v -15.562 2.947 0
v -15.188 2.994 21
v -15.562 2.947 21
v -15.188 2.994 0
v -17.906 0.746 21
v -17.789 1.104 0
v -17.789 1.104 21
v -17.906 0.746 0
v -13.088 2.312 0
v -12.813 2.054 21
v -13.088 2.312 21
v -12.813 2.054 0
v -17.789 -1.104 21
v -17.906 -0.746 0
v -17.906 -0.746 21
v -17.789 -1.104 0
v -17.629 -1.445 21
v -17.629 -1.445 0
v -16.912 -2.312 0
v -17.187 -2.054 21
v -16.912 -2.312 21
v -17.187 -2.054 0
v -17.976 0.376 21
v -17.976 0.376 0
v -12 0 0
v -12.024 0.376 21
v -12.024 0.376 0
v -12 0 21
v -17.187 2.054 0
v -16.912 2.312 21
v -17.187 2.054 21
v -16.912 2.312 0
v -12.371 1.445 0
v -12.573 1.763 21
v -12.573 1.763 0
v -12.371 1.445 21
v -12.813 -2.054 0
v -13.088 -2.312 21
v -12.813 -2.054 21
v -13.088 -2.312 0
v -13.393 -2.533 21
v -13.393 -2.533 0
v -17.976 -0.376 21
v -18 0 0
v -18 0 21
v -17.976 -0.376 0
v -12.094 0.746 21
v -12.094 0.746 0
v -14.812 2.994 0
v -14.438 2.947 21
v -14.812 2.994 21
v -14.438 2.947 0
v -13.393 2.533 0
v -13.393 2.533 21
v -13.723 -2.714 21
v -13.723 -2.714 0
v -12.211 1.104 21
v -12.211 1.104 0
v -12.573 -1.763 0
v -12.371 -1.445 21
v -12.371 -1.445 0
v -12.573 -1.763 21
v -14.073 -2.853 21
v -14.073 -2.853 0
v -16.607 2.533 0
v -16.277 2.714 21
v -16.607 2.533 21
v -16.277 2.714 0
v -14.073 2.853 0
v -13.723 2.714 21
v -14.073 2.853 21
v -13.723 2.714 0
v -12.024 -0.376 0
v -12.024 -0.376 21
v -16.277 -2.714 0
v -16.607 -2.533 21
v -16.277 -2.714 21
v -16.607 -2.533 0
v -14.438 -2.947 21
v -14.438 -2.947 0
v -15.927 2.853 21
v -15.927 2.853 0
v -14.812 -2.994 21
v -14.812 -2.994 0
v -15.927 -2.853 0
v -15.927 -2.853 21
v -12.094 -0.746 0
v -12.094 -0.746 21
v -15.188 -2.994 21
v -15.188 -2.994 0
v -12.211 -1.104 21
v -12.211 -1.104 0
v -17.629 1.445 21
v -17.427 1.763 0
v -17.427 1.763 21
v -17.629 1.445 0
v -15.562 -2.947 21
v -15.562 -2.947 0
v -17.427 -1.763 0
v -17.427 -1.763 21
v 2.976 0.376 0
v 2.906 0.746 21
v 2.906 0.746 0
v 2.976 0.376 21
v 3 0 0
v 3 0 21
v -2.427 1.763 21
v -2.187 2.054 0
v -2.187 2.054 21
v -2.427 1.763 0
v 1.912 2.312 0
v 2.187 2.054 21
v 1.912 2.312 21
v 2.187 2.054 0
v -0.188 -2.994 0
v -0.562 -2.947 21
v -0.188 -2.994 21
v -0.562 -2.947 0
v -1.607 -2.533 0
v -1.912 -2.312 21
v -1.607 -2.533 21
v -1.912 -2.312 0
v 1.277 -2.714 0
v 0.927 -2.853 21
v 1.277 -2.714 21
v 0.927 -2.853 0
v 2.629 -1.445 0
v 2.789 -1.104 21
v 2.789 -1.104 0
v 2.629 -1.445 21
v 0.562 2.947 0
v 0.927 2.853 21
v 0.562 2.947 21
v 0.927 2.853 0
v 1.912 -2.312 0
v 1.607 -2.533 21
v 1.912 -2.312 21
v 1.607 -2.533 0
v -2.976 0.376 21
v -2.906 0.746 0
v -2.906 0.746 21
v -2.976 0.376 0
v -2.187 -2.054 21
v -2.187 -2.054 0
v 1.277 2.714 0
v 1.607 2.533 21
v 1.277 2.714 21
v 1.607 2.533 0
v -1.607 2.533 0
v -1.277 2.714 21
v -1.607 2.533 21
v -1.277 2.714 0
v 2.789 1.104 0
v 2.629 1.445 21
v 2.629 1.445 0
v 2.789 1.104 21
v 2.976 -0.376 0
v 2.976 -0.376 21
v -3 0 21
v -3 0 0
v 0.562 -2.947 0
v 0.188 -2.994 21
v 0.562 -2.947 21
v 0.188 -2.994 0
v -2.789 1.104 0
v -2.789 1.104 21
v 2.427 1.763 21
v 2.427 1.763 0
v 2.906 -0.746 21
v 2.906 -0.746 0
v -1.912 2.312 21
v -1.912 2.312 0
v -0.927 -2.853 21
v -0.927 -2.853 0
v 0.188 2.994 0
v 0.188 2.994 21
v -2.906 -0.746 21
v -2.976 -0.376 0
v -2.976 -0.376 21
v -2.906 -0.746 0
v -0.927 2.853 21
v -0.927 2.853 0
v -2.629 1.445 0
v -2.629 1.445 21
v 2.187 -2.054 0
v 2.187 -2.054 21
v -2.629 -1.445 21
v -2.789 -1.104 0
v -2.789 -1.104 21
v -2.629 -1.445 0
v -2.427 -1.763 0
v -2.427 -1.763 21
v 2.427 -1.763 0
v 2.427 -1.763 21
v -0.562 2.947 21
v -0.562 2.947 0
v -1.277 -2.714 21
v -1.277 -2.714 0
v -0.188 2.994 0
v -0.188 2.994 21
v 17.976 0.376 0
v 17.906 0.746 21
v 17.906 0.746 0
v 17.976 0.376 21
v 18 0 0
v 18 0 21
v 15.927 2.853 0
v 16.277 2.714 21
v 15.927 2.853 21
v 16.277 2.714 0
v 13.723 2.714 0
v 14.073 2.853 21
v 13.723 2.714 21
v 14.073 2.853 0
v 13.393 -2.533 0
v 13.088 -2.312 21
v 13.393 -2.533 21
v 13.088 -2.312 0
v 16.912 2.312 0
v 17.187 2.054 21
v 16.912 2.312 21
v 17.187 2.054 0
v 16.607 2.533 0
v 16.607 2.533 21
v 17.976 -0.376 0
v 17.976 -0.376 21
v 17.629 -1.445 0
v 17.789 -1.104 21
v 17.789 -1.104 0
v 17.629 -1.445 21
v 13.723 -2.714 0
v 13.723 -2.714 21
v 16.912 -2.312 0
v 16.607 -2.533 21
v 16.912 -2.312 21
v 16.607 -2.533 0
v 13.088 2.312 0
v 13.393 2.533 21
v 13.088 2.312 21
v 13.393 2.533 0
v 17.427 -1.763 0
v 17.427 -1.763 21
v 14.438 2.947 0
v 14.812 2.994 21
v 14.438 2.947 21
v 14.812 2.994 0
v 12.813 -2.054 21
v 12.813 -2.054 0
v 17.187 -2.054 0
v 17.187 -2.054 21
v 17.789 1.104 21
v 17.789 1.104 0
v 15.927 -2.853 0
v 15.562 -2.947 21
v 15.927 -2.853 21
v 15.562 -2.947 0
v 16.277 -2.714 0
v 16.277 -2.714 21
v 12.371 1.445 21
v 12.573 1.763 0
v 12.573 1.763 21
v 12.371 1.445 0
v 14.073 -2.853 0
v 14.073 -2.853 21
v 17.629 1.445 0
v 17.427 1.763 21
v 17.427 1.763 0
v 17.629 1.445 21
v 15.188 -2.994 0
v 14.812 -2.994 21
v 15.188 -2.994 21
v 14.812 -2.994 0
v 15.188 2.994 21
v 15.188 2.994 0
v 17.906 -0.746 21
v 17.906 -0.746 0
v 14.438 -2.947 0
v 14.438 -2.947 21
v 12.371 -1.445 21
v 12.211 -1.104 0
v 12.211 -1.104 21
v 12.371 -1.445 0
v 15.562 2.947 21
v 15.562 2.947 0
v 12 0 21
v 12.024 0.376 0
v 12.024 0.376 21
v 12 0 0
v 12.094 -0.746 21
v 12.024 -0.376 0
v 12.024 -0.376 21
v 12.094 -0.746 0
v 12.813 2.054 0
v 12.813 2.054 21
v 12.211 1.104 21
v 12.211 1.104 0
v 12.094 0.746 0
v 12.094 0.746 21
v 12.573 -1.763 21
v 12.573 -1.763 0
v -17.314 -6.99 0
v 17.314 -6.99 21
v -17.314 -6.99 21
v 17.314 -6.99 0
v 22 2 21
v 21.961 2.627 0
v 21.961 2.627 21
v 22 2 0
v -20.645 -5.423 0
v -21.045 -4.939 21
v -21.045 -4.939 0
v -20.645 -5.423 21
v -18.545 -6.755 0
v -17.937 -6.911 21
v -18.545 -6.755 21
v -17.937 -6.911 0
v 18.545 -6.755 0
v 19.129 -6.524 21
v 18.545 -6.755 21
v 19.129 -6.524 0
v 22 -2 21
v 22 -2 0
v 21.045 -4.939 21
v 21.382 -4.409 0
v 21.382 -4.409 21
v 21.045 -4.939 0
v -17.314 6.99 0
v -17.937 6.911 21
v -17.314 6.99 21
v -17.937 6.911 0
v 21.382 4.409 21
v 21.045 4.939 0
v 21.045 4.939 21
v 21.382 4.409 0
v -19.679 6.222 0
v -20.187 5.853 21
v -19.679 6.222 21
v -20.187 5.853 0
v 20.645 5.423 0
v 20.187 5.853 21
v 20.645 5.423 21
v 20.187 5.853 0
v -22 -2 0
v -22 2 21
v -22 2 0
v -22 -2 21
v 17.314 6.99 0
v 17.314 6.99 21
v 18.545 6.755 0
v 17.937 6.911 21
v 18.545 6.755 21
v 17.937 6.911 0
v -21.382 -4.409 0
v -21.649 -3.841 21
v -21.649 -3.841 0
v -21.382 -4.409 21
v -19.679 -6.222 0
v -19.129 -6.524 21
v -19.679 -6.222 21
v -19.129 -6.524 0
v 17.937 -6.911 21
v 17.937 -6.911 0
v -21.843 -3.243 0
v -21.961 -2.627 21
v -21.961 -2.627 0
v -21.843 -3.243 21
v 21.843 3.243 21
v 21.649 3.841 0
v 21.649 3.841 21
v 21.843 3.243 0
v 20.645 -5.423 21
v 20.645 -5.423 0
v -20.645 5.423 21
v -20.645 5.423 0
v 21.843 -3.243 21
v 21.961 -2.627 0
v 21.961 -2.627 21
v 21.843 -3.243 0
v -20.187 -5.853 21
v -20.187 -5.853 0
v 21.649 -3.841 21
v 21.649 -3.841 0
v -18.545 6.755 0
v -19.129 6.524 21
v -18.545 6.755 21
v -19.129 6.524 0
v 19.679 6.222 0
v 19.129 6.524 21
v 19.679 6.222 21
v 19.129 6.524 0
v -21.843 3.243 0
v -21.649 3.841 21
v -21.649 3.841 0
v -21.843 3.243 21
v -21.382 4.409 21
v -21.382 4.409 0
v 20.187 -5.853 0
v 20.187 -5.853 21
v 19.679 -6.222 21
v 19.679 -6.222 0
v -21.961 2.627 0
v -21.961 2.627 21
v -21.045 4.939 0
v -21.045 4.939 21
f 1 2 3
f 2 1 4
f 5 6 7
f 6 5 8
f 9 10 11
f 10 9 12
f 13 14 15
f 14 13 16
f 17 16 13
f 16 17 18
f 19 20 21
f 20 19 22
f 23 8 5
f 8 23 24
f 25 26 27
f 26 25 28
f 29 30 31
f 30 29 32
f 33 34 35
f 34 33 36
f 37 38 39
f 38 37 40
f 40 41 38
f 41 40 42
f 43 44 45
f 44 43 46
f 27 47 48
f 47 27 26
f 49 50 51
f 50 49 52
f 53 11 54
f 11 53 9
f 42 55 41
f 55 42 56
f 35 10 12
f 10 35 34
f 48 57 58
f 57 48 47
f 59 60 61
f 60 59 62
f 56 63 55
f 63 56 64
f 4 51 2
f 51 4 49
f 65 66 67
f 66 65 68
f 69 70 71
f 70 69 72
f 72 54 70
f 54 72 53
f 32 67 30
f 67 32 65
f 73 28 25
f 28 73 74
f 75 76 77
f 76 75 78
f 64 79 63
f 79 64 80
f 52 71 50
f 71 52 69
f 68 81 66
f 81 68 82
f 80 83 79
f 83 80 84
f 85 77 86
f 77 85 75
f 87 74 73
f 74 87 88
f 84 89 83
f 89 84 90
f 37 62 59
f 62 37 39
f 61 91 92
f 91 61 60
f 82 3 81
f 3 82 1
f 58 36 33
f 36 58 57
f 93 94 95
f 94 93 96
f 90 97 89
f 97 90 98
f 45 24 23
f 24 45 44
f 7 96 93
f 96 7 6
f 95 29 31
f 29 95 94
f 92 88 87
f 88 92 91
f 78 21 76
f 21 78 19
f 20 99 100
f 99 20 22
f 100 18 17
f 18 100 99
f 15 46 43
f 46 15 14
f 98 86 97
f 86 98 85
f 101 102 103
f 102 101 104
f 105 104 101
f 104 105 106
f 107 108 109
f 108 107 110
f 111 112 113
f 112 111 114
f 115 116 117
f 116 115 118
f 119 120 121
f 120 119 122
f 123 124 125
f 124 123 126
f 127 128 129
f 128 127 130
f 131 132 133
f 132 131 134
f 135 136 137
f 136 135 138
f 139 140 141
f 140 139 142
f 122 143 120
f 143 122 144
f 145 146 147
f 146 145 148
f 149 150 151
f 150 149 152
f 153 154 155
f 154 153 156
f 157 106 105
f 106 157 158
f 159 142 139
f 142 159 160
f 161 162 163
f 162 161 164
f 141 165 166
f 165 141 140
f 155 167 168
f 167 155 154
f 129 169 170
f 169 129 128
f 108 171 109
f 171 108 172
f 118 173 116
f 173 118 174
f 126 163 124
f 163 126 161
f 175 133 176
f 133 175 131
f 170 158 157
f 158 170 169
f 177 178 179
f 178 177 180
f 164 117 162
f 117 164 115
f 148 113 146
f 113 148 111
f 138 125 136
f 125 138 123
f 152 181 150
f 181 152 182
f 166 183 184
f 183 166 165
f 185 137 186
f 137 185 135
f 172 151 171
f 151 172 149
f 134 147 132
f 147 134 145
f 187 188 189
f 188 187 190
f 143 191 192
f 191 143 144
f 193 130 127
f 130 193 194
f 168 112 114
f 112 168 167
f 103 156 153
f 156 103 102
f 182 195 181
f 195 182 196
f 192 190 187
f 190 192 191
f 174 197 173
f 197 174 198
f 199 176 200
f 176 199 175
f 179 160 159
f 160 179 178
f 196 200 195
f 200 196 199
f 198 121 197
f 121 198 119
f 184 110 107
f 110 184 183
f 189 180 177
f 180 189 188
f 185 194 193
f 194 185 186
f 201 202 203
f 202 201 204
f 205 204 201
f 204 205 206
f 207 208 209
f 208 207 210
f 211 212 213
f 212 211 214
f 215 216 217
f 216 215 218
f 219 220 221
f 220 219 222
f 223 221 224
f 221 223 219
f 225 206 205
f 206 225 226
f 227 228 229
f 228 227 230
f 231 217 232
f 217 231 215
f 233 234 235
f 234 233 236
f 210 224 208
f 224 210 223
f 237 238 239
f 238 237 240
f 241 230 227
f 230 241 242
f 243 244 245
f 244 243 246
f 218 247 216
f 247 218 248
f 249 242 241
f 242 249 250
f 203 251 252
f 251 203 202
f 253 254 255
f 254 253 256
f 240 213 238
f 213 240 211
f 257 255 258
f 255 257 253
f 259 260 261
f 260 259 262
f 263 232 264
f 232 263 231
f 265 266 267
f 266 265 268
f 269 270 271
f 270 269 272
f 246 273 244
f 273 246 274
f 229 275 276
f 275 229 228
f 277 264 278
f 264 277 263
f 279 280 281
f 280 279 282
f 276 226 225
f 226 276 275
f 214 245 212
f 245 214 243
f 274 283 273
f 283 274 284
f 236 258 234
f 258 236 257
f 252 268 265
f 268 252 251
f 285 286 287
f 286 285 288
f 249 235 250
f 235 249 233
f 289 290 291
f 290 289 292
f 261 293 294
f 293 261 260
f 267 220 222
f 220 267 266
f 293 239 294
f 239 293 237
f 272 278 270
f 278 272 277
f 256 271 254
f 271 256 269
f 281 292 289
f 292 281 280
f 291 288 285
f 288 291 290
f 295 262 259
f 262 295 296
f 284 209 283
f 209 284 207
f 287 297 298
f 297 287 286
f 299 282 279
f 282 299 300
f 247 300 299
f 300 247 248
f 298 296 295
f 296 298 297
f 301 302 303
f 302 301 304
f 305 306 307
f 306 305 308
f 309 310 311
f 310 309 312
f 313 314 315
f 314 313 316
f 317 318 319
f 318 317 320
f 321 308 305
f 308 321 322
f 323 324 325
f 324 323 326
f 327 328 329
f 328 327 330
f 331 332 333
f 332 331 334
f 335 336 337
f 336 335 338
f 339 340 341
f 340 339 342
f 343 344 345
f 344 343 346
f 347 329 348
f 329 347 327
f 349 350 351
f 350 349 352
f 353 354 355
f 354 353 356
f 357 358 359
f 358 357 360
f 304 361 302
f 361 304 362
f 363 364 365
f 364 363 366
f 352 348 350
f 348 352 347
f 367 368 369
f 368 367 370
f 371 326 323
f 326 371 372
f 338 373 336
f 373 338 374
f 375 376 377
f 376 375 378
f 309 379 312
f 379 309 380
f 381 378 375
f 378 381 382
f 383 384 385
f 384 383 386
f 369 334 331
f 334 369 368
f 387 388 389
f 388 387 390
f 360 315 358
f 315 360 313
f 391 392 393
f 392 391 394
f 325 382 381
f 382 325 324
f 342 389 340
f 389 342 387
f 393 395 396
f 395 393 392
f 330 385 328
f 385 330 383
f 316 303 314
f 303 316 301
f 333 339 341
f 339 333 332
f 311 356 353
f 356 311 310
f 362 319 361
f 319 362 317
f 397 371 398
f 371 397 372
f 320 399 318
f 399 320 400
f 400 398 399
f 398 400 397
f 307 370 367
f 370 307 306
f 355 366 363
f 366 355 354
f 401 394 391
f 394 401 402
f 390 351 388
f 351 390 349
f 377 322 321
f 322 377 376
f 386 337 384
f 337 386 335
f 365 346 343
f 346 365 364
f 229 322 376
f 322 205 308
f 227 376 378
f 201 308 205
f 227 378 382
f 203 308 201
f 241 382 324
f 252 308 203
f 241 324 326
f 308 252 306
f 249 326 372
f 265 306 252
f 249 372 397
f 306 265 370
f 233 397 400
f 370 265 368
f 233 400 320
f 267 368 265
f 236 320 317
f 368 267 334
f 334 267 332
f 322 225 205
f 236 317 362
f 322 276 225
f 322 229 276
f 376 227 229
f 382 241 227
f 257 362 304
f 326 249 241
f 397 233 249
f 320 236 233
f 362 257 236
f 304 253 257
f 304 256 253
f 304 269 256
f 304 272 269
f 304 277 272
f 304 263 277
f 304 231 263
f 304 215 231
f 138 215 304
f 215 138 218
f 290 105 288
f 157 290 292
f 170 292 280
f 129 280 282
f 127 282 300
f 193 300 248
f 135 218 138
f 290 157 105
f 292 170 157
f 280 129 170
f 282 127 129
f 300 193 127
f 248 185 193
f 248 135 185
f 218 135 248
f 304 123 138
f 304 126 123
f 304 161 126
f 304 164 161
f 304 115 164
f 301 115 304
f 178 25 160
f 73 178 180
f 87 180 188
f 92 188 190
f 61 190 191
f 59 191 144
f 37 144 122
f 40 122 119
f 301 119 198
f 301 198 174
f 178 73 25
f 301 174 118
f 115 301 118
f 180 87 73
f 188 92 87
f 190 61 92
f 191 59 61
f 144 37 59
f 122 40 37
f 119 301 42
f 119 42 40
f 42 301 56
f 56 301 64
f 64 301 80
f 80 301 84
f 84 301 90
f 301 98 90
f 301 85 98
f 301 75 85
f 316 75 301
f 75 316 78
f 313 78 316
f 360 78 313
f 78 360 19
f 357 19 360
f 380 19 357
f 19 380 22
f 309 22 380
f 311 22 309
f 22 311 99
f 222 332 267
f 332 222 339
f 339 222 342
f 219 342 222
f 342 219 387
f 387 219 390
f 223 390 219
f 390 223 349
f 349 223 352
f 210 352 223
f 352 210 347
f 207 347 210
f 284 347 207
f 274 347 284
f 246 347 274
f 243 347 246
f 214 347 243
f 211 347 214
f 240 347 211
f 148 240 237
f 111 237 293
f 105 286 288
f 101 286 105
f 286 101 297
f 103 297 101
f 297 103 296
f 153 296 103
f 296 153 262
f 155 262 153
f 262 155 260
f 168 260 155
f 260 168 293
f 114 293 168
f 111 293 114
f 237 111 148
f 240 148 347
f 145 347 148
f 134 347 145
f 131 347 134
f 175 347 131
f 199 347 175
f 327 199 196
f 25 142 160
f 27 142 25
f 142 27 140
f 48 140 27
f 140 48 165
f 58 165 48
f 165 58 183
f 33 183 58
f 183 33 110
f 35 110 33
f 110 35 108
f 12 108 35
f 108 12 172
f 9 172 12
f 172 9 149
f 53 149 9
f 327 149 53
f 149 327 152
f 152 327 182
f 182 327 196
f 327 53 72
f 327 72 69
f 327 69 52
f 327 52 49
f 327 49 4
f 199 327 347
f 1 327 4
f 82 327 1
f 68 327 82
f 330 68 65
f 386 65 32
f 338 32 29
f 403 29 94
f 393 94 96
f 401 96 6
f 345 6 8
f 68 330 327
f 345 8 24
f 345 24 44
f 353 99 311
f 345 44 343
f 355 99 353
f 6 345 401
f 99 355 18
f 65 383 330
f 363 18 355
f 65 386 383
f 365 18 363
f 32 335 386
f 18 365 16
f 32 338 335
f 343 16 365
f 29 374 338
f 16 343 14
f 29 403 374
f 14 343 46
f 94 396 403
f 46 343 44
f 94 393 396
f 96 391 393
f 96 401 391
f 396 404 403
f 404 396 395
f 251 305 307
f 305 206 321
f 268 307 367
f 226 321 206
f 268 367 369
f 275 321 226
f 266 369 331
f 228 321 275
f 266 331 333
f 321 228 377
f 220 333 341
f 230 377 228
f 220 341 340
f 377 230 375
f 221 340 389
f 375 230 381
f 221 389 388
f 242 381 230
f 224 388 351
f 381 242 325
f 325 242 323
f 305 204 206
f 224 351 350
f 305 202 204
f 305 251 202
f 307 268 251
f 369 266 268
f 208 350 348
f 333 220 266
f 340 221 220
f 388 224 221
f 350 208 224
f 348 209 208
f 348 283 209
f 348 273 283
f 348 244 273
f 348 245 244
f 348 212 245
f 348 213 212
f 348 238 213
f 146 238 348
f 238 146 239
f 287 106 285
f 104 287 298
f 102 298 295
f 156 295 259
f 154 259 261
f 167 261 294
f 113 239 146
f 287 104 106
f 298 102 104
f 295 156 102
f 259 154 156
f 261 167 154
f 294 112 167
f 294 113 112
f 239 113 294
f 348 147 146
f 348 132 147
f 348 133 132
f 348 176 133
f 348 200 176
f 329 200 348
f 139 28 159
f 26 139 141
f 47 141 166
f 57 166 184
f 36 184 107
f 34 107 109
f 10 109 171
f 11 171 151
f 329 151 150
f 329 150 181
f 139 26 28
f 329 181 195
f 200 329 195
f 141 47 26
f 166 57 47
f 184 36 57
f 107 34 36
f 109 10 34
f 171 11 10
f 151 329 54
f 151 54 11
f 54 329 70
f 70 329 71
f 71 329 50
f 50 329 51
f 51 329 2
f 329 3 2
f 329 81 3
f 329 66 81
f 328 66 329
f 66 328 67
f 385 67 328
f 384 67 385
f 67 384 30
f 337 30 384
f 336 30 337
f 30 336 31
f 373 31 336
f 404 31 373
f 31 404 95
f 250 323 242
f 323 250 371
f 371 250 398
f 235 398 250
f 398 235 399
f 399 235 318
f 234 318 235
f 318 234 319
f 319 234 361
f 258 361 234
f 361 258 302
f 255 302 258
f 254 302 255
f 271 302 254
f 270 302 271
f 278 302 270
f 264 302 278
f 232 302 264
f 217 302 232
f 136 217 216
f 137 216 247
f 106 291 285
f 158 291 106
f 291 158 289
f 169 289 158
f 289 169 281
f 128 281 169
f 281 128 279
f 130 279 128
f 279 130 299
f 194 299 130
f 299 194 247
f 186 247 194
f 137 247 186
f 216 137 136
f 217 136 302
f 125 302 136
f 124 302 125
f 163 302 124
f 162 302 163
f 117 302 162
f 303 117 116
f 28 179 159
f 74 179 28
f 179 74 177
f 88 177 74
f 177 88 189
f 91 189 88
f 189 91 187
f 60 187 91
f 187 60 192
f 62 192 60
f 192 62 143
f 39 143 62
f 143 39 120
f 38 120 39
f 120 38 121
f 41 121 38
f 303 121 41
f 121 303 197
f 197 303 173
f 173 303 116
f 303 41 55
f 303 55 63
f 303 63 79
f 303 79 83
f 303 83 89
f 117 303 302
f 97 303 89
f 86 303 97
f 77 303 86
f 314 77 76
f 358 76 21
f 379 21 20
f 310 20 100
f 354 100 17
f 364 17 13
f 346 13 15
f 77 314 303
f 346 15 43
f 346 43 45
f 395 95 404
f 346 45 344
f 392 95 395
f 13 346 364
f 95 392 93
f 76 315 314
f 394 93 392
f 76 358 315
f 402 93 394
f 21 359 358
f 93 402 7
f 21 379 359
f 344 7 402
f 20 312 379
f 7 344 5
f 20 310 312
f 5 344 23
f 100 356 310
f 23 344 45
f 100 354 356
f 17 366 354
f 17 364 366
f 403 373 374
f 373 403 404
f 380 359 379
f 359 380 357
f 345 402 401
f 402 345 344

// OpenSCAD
$fn = 50;


difference() {
	union() {
		hull() {
			translate(v = [-17.0000000000, 2.0000000000, 0]) {
				cylinder(h = 21, r = 5);
			}
			translate(v = [17.0000000000, 2.0000000000, 0]) {
				cylinder(h = 21, r = 5);
			}
			translate(v = [-17.0000000000, -2.0000000000, 0]) {
				cylinder(h = 21, r = 5);
			}
			translate(v = [17.0000000000, -2.0000000000, 0]) {
				cylinder(h = 21, r = 5);
			}
		}
	}
	union() {
		translate(v = [-15.0000000000, 0.0000000000, 0]) {
			translate(v = [0, 0, -100]) {
				cylinder(h = 200, r = 3.0000000000);
			}
		}
		translate(v = [0, 0, -100]) {
			cylinder(h = 200, r = 3.0000000000);
		}
		translate(v = [15.0000000000, 0.0000000000, 0]) {
			translate(v = [0, 0, -100]) {
				cylinder(h = 200, r = 3.0000000000);
			}
		}
	}
}
